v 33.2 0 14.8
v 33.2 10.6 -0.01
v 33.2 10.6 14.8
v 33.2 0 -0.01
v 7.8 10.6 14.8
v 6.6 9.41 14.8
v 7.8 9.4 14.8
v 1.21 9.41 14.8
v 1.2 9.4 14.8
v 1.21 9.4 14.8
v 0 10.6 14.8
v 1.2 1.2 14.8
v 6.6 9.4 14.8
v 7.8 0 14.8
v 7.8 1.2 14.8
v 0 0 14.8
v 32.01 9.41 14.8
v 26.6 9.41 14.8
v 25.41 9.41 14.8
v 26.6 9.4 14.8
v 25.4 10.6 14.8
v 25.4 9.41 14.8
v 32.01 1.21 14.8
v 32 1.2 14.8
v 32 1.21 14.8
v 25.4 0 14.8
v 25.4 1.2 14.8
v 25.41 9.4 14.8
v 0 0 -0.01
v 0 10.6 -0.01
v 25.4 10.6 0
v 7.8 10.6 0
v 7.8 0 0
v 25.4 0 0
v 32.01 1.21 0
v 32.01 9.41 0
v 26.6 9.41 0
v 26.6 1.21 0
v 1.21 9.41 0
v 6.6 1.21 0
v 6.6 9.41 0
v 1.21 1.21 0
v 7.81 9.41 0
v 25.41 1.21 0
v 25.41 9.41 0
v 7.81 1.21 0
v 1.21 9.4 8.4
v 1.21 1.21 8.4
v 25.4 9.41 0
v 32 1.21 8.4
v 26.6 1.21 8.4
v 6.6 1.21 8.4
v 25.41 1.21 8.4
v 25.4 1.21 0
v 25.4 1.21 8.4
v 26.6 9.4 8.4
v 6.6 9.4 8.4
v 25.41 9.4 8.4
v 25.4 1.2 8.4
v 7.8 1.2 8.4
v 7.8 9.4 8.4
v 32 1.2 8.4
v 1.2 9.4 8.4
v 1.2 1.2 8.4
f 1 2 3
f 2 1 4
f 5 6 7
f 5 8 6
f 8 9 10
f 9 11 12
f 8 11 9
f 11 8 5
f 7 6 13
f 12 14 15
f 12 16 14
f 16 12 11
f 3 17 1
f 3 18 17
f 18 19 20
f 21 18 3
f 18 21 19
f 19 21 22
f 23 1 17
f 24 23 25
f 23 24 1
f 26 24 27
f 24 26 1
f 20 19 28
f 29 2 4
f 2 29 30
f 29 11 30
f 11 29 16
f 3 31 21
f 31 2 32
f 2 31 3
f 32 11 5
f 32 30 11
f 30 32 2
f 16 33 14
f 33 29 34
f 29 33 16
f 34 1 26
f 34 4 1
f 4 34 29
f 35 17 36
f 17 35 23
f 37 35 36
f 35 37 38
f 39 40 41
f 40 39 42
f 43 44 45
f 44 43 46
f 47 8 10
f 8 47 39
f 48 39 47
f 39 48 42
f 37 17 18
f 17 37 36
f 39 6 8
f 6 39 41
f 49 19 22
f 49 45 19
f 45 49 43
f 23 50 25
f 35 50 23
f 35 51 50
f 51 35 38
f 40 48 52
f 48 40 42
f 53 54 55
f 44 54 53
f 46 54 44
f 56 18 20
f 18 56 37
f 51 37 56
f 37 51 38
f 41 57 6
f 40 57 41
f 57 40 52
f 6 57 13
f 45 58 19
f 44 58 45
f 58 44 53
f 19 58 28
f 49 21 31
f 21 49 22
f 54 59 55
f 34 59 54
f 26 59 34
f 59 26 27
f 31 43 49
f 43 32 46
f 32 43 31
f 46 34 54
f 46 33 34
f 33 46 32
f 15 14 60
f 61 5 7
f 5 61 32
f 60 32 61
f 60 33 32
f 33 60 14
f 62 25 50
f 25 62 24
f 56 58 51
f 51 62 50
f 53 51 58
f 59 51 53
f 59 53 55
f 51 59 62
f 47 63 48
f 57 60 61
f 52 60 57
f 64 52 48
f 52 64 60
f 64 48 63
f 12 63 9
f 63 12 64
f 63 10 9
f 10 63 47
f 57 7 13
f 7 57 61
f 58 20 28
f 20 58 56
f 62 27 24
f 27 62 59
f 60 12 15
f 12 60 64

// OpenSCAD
// file: ../Base/Boxes.scad
// Fischertechnik Box Foundation
// Pre-designed Boxes

use <Constants.scad>

include <PlacementOptions.scad>

box190Width = 190;
box190Depth = 130;
box130Width = 130;
box130Depth = 95;

// Values are from an original ec3 box
topBottomDifference = 1.5;
outerHeight = 40;
baseThickness = 1.8;
innerHeight = outerHeight - baseThickness;
stackExcess = 5.7;
radius = 3.5;
wallThickness = 1.5;
tolerance = 0.2;

boxWallThickness = wallThickness;
boxBaseThickness = baseThickness;
boxWebWidth = 3.0;

// getBoxWallThickness()
// Gets the wall thickness of a Fischertechnik Box
function getBoxWallThickness() = boxWallThickness;

// getBoxUsageHeight(height = 38.2)
// Gets the usable height of a Fischertechnik box
// height = Outer height of the box from the bottom to the upper edge.
function getBoxUsageHeight(height = outerHeight) = height - baseThickness - stackExcess;

// getBoxInnerHeight()
// Gets the inner height of a Fischertechnik box, including the stack excess
function getBoxInnerHeight() = innerHeight;

// getBoxBaseThickness()
// Gets the thickness of the Fischertechnik box base.
function getBoxBaseThickness() = boxBaseThickness;

// getBoxWebWidth()
// Gets the width of a box web
function getBoxWebWidth() = boxWebWidth;

// getBox190Space()
// Gets the usable inner space of a Box 190 as an x/y-list
function getBox190Space() = [
    box190Width - 2*getBoxWallThickness() - topBottomDifference, 
    box190Depth - 2*getBoxWallThickness() - topBottomDifference ];

// RoundedCornerPlate(width, depth, height, radius)
// Creates a body plate with rounded corners for a box. Used
// also to create the complete box with the hull module.
// width = Width of the plate
// depth = depth of the plate 
// height = thickness of the plate
// radius = radius of the rounded corner
module RoundedCornerPlate(width, depth, height, radius) {
    translate([radius, radius])
    hull() {
        w = width-2*radius;
        d = depth-2*radius;
        cube([w, d, height]);
        cylinder(height, r=radius, $fn=getFragments());
        translate([w, 0])
            cylinder(height, r=radius, $fn=getFragments());
        translate([w, d])
            cylinder(height, r=radius, $fn=getFragments());
        translate([0, d])
            cylinder(height, r=radius, $fn=getFragments());
    }
}

// BoxBase(width, depth)
// Creates an empty stackable Fischertechnik compatible box
// width = Outer width of the box (190, 130, ...)
// depth = Outer depth of the box (130, 95, ...)

module BoxBase(width, depth, height=outerHeight) {    
    thinPlate = 0.01;

    innerHeight = height - baseThickness;    
    
    module Body(tolerance=tolerance) {
        hull() {
            // Bottom with tolerance to fit into the original boxes when stacked
            translate([-wallThickness+tolerance, -wallThickness+tolerance, -baseThickness])
                RoundedCornerPlate(width-topBottomDifference-2*tolerance, depth-topBottomDifference-2*tolerance, thinPlate, radius);
            
            // Top
            translate([-wallThickness-topBottomDifference/2, -wallThickness-topBottomDifference/2, innerHeight-thinPlate])
                RoundedCornerPlate(width, depth, thinPlate, radius);
         }
    }

    module Cutoff() {
        hull() {
            coWidth = width - 2*wallThickness;
            coDepth = depth - 2*wallThickness;
            
            // Bottom
            RoundedCornerPlate(coWidth-topBottomDifference, coDepth-topBottomDifference, thinPlate, radius);

            // Top
            translate([-topBottomDifference/2, -topBottomDifference/2, innerHeight+thinPlate]) 
                RoundedCornerPlate(coWidth, coDepth, thinPlate, radius);
        }
    }
    
    difference() {        
        Body();
        Cutoff();
        stackOffset = innerHeight - stackExcess;
        translate([0, 0, stackOffset + baseThickness])
            Body(tolerance=0);
    }
}

// Creates the Fischertechnik empty box 130x190 mm and places it at position 0,0
// 190x130 are the outer sizes, the inner space is slightly smaller. Use getBox190Space() to get the inner sizes.
// The box is positioned that the usable inner space is at the 0,0,0 position.

module Box190() {
    BoxBase(box190Width, box190Depth);
}

// Gets the usable inner space of a Box 130 as an x/y-list
function getBox130Space() = [
    box130Width - 2*getBoxWallThickness() - topBottomDifference, 
    box130Depth - 2*getBoxWallThickness() - topBottomDifference ];

// Creates the Fischertechnik empty box 95x130 mm and places it at position 0,0
// 190x130 are the outer sizes, the inner space is slightly smaller. Use getBox190Space() to get the inner sizes.
// The box is positioned that the usable inner space is at the 0,0,0 position.

module Box130() {
    BoxBase(box130Width, box130Depth);
}

// Creates a web at the specified box walls
// corner 0 = LowerLeft, 1 = UpperLeft, 2 = UpperRight, 3 = LowerRight
// side 0 = LeftOfCorner, 1 = RightOfCorner
// distance = Distance in mm from the corner
// boxSpace = inner width and depth of the box (default: Box 190)
// webWidth = length of the web (default is 3 mms)
// webThickness = thickness of the web (default is 1 mm)
// height = Height of the web (standard is getBoxUsageHeight())
// sink = How much of the web is sunk into the wall

module BoxWeb(
    corner, 
    side, 
    distance, 
    boxSpace=getBox190Space(), 
    webWidth=getBoxWebWidth(), 
    webThickness=1.0, 
    height=getBoxUsageHeight(),
    sink = getBoxWallThickness()/2) {
    width = (corner % 2 == 0) ? 
            (side == LeftOfCorner ? webWidth : webThickness) :
            (side == LeftOfCorner ? webThickness : webWidth);

    depth = (corner % 2 == 0) ? 
            (side == RightOfCorner ? webWidth : webThickness) :
            (side == RightOfCorner ? webThickness : webWidth);
    
    xDiff = corner == LowerLeft ? 
                (side == LeftOfCorner ? -sink : distance) :
            (corner == UpperLeft ?                
                (side == LeftOfCorner ? distance : -sink) :
            (corner == UpperRight ?
                (side == LeftOfCorner ? boxSpace.x-webWidth+sink : boxSpace.x-distance-webThickness) :
                (side == LeftOfCorner ? boxSpace.x-distance-webThickness: boxSpace.x-webWidth+sink)));

    yDiff = corner == LowerLeft ? 
                (side == RightOfCorner ? -sink : distance) :
            (corner == UpperLeft ?
                (side == RightOfCorner ? boxSpace.y-distance-webThickness : boxSpace.y-webWidth+sink) :
            (corner == UpperRight ?
                (side == RightOfCorner ? boxSpace.y-webWidth+sink : boxSpace.y-distance-webThickness) :
                (side == RightOfCorner ? distance : -sink)));
    
    translate([xDiff, yDiff, -getExcess()])
        cube([width, depth, height + 2*getExcess()]);
}
// file: ../Base/Rotation.scad
// Fischertechnik Box Foundation
// Geometry Helpers Rotation

include <PlacementOptions.scad>

// getRotatedSpace(space, rotation=NoRotation)
// Rotates the space dependent on the specified rotation

function getRotatedSpace(space, rotation=NoRotation) = [
    (rotation == Rotate90 || rotation == Rotate270) ? space.y : space.x,
    (rotation == Rotate90 || rotation == Rotate270) ? space.x : space.y
];

// Rotates the given space around the fixed left lower corner
// space = the space the children needs as width/depth list [width,depth]
// rotation = 0 Rotate0 degrees, 1 Rotate90 degrees, 2 Rotate180 degrees, 3 Rotate270 degrees (equivalent to -90)

module RotateFix(space, rotation=NoRotation) {
    dy = (rotation == Rotate0 || rotation == Rotate270) ? 0 :
        (rotation == Rotate90) ? space.x :
        space.y;
    dx = (rotation < Rotate180) ? 0 :
        (rotation == Rotate180) ? space.x :
        space.y;
    
    translate([dx, dy, 0])
        rotate([0, 0, rotations[rotation]])
            children();
}
// file: ../Base/Alignment.scad
// Fischertechnik Box Foundation
// Geometry Helpers Alignment

include <PlacementOptions.scad>

// getAlignedX(elementWidth, spaceWidth, align=AlignRight, offset=0)
// Gets the aligned X offset of an element with the given
// width in the given space.
// elementWidth = The width of the element to positon
// spaceWidth = The space where the element should be aligned
// align = 0 AlignLeft, 1 AlignCenter, 2 AlignRight
// offset = an optional offset from the aligned position. When
// aligned left or centered, then positive values are in X direction.
// When aligned right then positive values are in negative X direction.

function getAlignedX(elementWidth, spaceWidth, align=AlignRight, offset=0) =
    (align == AlignLeft) ?
        offset :
        ((align == AlignCenter) ?
        (spaceWidth - elementWidth)/2 + offset :
        spaceWidth - offset - elementWidth);

// getAlignedY(elementDepth, spaceDepth, align=AlignTop, offset=0)
// Gets the aligned Y offset of an element with the given
// depth in the given space.
// elementDepth = The depth of the element to positon
// spaceDepth = The space where the element should be aligned
// align = 0 AlignBottom, 1 AlignCenter, 2 AlignTop
// offset = an optional offset from the aligned position. When
// aligned bottom or centered, then positive values are in Y direction.
// When aligned top then positive values are in negative Y direction.

function getAlignedY(elementDepth, spaceDepth, align=AlignTop, offset=0) =
    (align == AlignBottom) ?
        offset :
        ((align == AlignCenter) ?
        (spaceDepth - elementDepth)/2 + offset :
        spaceDepth - offset - elementDepth);
// file: ../Base/PlacementOptions.scad
// Fischertechnik Box Foundation
// Placement Options

// Alignment
NoAlign = 0;
AlignLeft = 1;
AlignBottom = 2;
AlignCenter = 3;
AlignRight = 4;
AlignTop = 5;

// Element rotation degree steps
rotations = [0, -90, -180, -270];

// Rotation
NoRotation = 0;
Rotate0 = 0;
Rotate90 = 1;
Rotate180 = 2;
Rotate270 = 3;

// Docking (seen from above)
NoDock = -1;
DockLeft = 0;
DockTop = 1;
DockRight = 2;
DockCorner = 2;
DockBottom = 3;

// Web corners
LowerLeft = 0;
UpperLeft = 1;
UpperRight = 2;
LowerRight = 3;

// Web position relative to corner
LeftOfCorner = 0;
RightOfCorner = 1;
// file: ../Base/Placement.scad
// Fischertechnik Box Foundation
// Geometry Helpers Placement

use <Constants.scad>
use <Alignment.scad>
use <Rotation.scad>
use <Boxes.scad>

include <PlacementOptions.scad>

// Place(x=0, y=0, elementSpace=[0,0], alignX=AlignLeft, alignY=AlignBottom, rotation=Rotate0, boxSpace=getBox190Space())
// Places the child at the specified position
// y = Y-Position. This is a relative position when an X aligment is specified.
// x = X-Position. This is a relative position when an Y aligment is specified.
// elementSpace = space of the element to be placed [x,y]
// alignX = -1=NoAlign, 0 AlignLeft, 1 AlignCenter, 3 AlignRight (elementSpace and boxSpace required!)
// alignY = -1=NoAlign, 2 AlignBottom, 1 AlignCenter, 4 AlignTop (elementSpace and boxSpace required!)
// rotation = 0 Rotate0 0 degrees, 1 Rotate90 90 degrees, 
// 2 Rotate180 180 degrees, 3 Rotate270 270 degrees (equivalent to -90)
// boxSpace = Inner space of the box where the placement occurs [x,y] - default is Box 190x130 inner space

module Place(x=0, y=0, elementSpace=[0,0], 
  alignX=AlignLeft, alignY=AlignBottom, 
  rotation=NoRotation, boxSpace=getBox190Space()) {

    module Position(x, y, space, rotation=Rotate0) {
        translate([x, y, 0])
            RotateFix(space, rotation)
                children();
    }

    space = getRotatedSpace(elementSpace, rotation);
    alignedX = getAlignedX(space.x, boxSpace.x, alignX, x);
    alignedY = getAlignedY(space.y, boxSpace.y, alignY, y);
    Position(alignedX, alignedY, elementSpace, rotation)
        children();
}

// Center(space=getBox130Space(), elementSpace=[0,0])
// space = Space where the children is centered. For cylinder use centered=true and no elementSpace.
// elementSpace = space of the element to be centered [x,y]

module Center(space=getBox190Space(), elementSpace=[0,0]) {
    Place(elementSpace=elementSpace, boxSpace=space, alignX=AlignCenter, alignY=AlignCenter)
        children();
}

// CenterHorizontal(width=0, y=0, offset=0, space=getBox130Space())
// width = Width of the element to be placed.
// y = Y position of the element
// offset = Offset from the center position (negative will be left of the center)
// space = Space where the element is placed

module CenterHorizontal(width=0, y=0, offset=0, space=getBox190Space()) {
    Place(x=offset, y=y, elementSpace=[width, 0], boxSpace=space, alignX=AlignCenter)
        children(0);
}

// CenterVertical(depth=0, x=0, offset=0, space=getBox130Space())
// depth = Depth of the element to be placed.
// x = X position of the element
// offset = Offset from the center position (negative will be down of the center)
// space = Space where the element is placed

module CenterVertical(depth=0, x=0, offset=0, space=getBox190Space()) {
    Place(x=x, y=offset, elementSpace=[0, depth], boxSpace=space, alignY=AlignCenter)
        children(0);
}

// getIsVertical(align)
// True if the specified alignment needs a vertical orientation for a divider (AlignRight, AlignLeft)

function getIsVertical(align) = (align == AlignRight || align == AlignLeft);

// getIsHorizontal(align)
// True if the specified alignment needs a horizontal orientation for a divider (AlignTop, AlignBottom)

function getIsHorizontal(align) = (align == AlignTop || align == AlignBottom);
// file: ../Base/Constants.scad
// Fischertechnik Box Foundation
// Constants

// Constant values necessary for multiple elements

// Base constants
dividerThickness = 1.2;
excess = 0.01;
fragments = 90;
tolerance = 0.8;

// Gets the thickness of a divider 
function getDividerThickness() = dividerThickness;

// Gets the excess that is used to merge walls into each other
function getExcess() = excess;

// Gets amount of fragments of a cylinder
function getFragments() = fragments;

// Gets the inner tolerance of a frame to each side
function getTolerance() = tolerance;


// Fischertechnik specific constants
axisDiameter = 4;
axisBottomDiameter = axisDiameter + 1;
axisTolerance = 0.2;

// Gets axis diameter of Fischertechnik axis
function getAxisDiameter() = axisDiameter;

// Gets axis diameter tolerance (subtracted for element axis)
function getAxisTolerance() = axisTolerance;

// Gets the axis diameter for standing axis
function getStandAxisDiameter() = getAxisDiameter() - getAxisTolerance();

// Gets axis bottom diameter for thicker part at the bottom
function getAxisBottomDiameter() = axisBottomDiameter;

pinHeight = 2.5;

// gets the height of a connecting pin
function getPinHeight() = pinHeight;

standardEdgeDistance = 2.5;
standardWebDistance = 11.5;
standardCornerLength = 15;

// gets the standard distance to the wall of the box for dockable frames with webs
function getStandardEdgeDistance() = standardEdgeDistance;

// gets the standard distance of each web to the corner of the dockable frame
function getStandardWebDistance() = standardWebDistance;

// gets the standard length of the corner walls of a dockable frame
function getStandardCornerLength() = standardCornerLength;

tubeWallFactor = 0.8;

// gets the wall thickness of a tube.
function getTubeWallThickness() = tubeWallFactor * getDividerThickness();

smallPartsFrameHeight = 20;

// gets the frame height for docked small parts boxes.
function getSmallPartsFrameHeight() = smallPartsFrameHeight;

hubRingDiameter = 19.5;
hubRingLevelDiameter = 21;

// gets the diameter of a tube matching the inner ring of a wheel
function getHubRingDiameter() = hubRingDiameter;

// gets the diameter of a hub tube with a thicker diameter
function getHubRingLevelDiameter() = hubRingLevelDiameter;
// main file
// Fischertechnik Box Library
// Frame for two Connectors 30
// 31061

use <../ModelBase/Complex.scad>

/* [Hidden] */
width = 30;
depth = 8.2;
height = 14.8;

// getFrameTwoConnectors30Space()
// Gets the space needed for the frame for two struts.
function getFrameTwoConnectors30Space() = getElevatedFramesWithCutoffSpace([width, depth, height]);

// FrameTwoConnectors30()
// Frame for two connectors 30

module FrameTwoConnectors30() {    
    bearingLength = 6.6;
    loadHeight = 6.4;
    
    ElevatedFramesWithCutoff([width, depth, loadHeight], depth, height, bearingLength);
}

// Test
color("lightgray")
FrameTwoConnectors30();
